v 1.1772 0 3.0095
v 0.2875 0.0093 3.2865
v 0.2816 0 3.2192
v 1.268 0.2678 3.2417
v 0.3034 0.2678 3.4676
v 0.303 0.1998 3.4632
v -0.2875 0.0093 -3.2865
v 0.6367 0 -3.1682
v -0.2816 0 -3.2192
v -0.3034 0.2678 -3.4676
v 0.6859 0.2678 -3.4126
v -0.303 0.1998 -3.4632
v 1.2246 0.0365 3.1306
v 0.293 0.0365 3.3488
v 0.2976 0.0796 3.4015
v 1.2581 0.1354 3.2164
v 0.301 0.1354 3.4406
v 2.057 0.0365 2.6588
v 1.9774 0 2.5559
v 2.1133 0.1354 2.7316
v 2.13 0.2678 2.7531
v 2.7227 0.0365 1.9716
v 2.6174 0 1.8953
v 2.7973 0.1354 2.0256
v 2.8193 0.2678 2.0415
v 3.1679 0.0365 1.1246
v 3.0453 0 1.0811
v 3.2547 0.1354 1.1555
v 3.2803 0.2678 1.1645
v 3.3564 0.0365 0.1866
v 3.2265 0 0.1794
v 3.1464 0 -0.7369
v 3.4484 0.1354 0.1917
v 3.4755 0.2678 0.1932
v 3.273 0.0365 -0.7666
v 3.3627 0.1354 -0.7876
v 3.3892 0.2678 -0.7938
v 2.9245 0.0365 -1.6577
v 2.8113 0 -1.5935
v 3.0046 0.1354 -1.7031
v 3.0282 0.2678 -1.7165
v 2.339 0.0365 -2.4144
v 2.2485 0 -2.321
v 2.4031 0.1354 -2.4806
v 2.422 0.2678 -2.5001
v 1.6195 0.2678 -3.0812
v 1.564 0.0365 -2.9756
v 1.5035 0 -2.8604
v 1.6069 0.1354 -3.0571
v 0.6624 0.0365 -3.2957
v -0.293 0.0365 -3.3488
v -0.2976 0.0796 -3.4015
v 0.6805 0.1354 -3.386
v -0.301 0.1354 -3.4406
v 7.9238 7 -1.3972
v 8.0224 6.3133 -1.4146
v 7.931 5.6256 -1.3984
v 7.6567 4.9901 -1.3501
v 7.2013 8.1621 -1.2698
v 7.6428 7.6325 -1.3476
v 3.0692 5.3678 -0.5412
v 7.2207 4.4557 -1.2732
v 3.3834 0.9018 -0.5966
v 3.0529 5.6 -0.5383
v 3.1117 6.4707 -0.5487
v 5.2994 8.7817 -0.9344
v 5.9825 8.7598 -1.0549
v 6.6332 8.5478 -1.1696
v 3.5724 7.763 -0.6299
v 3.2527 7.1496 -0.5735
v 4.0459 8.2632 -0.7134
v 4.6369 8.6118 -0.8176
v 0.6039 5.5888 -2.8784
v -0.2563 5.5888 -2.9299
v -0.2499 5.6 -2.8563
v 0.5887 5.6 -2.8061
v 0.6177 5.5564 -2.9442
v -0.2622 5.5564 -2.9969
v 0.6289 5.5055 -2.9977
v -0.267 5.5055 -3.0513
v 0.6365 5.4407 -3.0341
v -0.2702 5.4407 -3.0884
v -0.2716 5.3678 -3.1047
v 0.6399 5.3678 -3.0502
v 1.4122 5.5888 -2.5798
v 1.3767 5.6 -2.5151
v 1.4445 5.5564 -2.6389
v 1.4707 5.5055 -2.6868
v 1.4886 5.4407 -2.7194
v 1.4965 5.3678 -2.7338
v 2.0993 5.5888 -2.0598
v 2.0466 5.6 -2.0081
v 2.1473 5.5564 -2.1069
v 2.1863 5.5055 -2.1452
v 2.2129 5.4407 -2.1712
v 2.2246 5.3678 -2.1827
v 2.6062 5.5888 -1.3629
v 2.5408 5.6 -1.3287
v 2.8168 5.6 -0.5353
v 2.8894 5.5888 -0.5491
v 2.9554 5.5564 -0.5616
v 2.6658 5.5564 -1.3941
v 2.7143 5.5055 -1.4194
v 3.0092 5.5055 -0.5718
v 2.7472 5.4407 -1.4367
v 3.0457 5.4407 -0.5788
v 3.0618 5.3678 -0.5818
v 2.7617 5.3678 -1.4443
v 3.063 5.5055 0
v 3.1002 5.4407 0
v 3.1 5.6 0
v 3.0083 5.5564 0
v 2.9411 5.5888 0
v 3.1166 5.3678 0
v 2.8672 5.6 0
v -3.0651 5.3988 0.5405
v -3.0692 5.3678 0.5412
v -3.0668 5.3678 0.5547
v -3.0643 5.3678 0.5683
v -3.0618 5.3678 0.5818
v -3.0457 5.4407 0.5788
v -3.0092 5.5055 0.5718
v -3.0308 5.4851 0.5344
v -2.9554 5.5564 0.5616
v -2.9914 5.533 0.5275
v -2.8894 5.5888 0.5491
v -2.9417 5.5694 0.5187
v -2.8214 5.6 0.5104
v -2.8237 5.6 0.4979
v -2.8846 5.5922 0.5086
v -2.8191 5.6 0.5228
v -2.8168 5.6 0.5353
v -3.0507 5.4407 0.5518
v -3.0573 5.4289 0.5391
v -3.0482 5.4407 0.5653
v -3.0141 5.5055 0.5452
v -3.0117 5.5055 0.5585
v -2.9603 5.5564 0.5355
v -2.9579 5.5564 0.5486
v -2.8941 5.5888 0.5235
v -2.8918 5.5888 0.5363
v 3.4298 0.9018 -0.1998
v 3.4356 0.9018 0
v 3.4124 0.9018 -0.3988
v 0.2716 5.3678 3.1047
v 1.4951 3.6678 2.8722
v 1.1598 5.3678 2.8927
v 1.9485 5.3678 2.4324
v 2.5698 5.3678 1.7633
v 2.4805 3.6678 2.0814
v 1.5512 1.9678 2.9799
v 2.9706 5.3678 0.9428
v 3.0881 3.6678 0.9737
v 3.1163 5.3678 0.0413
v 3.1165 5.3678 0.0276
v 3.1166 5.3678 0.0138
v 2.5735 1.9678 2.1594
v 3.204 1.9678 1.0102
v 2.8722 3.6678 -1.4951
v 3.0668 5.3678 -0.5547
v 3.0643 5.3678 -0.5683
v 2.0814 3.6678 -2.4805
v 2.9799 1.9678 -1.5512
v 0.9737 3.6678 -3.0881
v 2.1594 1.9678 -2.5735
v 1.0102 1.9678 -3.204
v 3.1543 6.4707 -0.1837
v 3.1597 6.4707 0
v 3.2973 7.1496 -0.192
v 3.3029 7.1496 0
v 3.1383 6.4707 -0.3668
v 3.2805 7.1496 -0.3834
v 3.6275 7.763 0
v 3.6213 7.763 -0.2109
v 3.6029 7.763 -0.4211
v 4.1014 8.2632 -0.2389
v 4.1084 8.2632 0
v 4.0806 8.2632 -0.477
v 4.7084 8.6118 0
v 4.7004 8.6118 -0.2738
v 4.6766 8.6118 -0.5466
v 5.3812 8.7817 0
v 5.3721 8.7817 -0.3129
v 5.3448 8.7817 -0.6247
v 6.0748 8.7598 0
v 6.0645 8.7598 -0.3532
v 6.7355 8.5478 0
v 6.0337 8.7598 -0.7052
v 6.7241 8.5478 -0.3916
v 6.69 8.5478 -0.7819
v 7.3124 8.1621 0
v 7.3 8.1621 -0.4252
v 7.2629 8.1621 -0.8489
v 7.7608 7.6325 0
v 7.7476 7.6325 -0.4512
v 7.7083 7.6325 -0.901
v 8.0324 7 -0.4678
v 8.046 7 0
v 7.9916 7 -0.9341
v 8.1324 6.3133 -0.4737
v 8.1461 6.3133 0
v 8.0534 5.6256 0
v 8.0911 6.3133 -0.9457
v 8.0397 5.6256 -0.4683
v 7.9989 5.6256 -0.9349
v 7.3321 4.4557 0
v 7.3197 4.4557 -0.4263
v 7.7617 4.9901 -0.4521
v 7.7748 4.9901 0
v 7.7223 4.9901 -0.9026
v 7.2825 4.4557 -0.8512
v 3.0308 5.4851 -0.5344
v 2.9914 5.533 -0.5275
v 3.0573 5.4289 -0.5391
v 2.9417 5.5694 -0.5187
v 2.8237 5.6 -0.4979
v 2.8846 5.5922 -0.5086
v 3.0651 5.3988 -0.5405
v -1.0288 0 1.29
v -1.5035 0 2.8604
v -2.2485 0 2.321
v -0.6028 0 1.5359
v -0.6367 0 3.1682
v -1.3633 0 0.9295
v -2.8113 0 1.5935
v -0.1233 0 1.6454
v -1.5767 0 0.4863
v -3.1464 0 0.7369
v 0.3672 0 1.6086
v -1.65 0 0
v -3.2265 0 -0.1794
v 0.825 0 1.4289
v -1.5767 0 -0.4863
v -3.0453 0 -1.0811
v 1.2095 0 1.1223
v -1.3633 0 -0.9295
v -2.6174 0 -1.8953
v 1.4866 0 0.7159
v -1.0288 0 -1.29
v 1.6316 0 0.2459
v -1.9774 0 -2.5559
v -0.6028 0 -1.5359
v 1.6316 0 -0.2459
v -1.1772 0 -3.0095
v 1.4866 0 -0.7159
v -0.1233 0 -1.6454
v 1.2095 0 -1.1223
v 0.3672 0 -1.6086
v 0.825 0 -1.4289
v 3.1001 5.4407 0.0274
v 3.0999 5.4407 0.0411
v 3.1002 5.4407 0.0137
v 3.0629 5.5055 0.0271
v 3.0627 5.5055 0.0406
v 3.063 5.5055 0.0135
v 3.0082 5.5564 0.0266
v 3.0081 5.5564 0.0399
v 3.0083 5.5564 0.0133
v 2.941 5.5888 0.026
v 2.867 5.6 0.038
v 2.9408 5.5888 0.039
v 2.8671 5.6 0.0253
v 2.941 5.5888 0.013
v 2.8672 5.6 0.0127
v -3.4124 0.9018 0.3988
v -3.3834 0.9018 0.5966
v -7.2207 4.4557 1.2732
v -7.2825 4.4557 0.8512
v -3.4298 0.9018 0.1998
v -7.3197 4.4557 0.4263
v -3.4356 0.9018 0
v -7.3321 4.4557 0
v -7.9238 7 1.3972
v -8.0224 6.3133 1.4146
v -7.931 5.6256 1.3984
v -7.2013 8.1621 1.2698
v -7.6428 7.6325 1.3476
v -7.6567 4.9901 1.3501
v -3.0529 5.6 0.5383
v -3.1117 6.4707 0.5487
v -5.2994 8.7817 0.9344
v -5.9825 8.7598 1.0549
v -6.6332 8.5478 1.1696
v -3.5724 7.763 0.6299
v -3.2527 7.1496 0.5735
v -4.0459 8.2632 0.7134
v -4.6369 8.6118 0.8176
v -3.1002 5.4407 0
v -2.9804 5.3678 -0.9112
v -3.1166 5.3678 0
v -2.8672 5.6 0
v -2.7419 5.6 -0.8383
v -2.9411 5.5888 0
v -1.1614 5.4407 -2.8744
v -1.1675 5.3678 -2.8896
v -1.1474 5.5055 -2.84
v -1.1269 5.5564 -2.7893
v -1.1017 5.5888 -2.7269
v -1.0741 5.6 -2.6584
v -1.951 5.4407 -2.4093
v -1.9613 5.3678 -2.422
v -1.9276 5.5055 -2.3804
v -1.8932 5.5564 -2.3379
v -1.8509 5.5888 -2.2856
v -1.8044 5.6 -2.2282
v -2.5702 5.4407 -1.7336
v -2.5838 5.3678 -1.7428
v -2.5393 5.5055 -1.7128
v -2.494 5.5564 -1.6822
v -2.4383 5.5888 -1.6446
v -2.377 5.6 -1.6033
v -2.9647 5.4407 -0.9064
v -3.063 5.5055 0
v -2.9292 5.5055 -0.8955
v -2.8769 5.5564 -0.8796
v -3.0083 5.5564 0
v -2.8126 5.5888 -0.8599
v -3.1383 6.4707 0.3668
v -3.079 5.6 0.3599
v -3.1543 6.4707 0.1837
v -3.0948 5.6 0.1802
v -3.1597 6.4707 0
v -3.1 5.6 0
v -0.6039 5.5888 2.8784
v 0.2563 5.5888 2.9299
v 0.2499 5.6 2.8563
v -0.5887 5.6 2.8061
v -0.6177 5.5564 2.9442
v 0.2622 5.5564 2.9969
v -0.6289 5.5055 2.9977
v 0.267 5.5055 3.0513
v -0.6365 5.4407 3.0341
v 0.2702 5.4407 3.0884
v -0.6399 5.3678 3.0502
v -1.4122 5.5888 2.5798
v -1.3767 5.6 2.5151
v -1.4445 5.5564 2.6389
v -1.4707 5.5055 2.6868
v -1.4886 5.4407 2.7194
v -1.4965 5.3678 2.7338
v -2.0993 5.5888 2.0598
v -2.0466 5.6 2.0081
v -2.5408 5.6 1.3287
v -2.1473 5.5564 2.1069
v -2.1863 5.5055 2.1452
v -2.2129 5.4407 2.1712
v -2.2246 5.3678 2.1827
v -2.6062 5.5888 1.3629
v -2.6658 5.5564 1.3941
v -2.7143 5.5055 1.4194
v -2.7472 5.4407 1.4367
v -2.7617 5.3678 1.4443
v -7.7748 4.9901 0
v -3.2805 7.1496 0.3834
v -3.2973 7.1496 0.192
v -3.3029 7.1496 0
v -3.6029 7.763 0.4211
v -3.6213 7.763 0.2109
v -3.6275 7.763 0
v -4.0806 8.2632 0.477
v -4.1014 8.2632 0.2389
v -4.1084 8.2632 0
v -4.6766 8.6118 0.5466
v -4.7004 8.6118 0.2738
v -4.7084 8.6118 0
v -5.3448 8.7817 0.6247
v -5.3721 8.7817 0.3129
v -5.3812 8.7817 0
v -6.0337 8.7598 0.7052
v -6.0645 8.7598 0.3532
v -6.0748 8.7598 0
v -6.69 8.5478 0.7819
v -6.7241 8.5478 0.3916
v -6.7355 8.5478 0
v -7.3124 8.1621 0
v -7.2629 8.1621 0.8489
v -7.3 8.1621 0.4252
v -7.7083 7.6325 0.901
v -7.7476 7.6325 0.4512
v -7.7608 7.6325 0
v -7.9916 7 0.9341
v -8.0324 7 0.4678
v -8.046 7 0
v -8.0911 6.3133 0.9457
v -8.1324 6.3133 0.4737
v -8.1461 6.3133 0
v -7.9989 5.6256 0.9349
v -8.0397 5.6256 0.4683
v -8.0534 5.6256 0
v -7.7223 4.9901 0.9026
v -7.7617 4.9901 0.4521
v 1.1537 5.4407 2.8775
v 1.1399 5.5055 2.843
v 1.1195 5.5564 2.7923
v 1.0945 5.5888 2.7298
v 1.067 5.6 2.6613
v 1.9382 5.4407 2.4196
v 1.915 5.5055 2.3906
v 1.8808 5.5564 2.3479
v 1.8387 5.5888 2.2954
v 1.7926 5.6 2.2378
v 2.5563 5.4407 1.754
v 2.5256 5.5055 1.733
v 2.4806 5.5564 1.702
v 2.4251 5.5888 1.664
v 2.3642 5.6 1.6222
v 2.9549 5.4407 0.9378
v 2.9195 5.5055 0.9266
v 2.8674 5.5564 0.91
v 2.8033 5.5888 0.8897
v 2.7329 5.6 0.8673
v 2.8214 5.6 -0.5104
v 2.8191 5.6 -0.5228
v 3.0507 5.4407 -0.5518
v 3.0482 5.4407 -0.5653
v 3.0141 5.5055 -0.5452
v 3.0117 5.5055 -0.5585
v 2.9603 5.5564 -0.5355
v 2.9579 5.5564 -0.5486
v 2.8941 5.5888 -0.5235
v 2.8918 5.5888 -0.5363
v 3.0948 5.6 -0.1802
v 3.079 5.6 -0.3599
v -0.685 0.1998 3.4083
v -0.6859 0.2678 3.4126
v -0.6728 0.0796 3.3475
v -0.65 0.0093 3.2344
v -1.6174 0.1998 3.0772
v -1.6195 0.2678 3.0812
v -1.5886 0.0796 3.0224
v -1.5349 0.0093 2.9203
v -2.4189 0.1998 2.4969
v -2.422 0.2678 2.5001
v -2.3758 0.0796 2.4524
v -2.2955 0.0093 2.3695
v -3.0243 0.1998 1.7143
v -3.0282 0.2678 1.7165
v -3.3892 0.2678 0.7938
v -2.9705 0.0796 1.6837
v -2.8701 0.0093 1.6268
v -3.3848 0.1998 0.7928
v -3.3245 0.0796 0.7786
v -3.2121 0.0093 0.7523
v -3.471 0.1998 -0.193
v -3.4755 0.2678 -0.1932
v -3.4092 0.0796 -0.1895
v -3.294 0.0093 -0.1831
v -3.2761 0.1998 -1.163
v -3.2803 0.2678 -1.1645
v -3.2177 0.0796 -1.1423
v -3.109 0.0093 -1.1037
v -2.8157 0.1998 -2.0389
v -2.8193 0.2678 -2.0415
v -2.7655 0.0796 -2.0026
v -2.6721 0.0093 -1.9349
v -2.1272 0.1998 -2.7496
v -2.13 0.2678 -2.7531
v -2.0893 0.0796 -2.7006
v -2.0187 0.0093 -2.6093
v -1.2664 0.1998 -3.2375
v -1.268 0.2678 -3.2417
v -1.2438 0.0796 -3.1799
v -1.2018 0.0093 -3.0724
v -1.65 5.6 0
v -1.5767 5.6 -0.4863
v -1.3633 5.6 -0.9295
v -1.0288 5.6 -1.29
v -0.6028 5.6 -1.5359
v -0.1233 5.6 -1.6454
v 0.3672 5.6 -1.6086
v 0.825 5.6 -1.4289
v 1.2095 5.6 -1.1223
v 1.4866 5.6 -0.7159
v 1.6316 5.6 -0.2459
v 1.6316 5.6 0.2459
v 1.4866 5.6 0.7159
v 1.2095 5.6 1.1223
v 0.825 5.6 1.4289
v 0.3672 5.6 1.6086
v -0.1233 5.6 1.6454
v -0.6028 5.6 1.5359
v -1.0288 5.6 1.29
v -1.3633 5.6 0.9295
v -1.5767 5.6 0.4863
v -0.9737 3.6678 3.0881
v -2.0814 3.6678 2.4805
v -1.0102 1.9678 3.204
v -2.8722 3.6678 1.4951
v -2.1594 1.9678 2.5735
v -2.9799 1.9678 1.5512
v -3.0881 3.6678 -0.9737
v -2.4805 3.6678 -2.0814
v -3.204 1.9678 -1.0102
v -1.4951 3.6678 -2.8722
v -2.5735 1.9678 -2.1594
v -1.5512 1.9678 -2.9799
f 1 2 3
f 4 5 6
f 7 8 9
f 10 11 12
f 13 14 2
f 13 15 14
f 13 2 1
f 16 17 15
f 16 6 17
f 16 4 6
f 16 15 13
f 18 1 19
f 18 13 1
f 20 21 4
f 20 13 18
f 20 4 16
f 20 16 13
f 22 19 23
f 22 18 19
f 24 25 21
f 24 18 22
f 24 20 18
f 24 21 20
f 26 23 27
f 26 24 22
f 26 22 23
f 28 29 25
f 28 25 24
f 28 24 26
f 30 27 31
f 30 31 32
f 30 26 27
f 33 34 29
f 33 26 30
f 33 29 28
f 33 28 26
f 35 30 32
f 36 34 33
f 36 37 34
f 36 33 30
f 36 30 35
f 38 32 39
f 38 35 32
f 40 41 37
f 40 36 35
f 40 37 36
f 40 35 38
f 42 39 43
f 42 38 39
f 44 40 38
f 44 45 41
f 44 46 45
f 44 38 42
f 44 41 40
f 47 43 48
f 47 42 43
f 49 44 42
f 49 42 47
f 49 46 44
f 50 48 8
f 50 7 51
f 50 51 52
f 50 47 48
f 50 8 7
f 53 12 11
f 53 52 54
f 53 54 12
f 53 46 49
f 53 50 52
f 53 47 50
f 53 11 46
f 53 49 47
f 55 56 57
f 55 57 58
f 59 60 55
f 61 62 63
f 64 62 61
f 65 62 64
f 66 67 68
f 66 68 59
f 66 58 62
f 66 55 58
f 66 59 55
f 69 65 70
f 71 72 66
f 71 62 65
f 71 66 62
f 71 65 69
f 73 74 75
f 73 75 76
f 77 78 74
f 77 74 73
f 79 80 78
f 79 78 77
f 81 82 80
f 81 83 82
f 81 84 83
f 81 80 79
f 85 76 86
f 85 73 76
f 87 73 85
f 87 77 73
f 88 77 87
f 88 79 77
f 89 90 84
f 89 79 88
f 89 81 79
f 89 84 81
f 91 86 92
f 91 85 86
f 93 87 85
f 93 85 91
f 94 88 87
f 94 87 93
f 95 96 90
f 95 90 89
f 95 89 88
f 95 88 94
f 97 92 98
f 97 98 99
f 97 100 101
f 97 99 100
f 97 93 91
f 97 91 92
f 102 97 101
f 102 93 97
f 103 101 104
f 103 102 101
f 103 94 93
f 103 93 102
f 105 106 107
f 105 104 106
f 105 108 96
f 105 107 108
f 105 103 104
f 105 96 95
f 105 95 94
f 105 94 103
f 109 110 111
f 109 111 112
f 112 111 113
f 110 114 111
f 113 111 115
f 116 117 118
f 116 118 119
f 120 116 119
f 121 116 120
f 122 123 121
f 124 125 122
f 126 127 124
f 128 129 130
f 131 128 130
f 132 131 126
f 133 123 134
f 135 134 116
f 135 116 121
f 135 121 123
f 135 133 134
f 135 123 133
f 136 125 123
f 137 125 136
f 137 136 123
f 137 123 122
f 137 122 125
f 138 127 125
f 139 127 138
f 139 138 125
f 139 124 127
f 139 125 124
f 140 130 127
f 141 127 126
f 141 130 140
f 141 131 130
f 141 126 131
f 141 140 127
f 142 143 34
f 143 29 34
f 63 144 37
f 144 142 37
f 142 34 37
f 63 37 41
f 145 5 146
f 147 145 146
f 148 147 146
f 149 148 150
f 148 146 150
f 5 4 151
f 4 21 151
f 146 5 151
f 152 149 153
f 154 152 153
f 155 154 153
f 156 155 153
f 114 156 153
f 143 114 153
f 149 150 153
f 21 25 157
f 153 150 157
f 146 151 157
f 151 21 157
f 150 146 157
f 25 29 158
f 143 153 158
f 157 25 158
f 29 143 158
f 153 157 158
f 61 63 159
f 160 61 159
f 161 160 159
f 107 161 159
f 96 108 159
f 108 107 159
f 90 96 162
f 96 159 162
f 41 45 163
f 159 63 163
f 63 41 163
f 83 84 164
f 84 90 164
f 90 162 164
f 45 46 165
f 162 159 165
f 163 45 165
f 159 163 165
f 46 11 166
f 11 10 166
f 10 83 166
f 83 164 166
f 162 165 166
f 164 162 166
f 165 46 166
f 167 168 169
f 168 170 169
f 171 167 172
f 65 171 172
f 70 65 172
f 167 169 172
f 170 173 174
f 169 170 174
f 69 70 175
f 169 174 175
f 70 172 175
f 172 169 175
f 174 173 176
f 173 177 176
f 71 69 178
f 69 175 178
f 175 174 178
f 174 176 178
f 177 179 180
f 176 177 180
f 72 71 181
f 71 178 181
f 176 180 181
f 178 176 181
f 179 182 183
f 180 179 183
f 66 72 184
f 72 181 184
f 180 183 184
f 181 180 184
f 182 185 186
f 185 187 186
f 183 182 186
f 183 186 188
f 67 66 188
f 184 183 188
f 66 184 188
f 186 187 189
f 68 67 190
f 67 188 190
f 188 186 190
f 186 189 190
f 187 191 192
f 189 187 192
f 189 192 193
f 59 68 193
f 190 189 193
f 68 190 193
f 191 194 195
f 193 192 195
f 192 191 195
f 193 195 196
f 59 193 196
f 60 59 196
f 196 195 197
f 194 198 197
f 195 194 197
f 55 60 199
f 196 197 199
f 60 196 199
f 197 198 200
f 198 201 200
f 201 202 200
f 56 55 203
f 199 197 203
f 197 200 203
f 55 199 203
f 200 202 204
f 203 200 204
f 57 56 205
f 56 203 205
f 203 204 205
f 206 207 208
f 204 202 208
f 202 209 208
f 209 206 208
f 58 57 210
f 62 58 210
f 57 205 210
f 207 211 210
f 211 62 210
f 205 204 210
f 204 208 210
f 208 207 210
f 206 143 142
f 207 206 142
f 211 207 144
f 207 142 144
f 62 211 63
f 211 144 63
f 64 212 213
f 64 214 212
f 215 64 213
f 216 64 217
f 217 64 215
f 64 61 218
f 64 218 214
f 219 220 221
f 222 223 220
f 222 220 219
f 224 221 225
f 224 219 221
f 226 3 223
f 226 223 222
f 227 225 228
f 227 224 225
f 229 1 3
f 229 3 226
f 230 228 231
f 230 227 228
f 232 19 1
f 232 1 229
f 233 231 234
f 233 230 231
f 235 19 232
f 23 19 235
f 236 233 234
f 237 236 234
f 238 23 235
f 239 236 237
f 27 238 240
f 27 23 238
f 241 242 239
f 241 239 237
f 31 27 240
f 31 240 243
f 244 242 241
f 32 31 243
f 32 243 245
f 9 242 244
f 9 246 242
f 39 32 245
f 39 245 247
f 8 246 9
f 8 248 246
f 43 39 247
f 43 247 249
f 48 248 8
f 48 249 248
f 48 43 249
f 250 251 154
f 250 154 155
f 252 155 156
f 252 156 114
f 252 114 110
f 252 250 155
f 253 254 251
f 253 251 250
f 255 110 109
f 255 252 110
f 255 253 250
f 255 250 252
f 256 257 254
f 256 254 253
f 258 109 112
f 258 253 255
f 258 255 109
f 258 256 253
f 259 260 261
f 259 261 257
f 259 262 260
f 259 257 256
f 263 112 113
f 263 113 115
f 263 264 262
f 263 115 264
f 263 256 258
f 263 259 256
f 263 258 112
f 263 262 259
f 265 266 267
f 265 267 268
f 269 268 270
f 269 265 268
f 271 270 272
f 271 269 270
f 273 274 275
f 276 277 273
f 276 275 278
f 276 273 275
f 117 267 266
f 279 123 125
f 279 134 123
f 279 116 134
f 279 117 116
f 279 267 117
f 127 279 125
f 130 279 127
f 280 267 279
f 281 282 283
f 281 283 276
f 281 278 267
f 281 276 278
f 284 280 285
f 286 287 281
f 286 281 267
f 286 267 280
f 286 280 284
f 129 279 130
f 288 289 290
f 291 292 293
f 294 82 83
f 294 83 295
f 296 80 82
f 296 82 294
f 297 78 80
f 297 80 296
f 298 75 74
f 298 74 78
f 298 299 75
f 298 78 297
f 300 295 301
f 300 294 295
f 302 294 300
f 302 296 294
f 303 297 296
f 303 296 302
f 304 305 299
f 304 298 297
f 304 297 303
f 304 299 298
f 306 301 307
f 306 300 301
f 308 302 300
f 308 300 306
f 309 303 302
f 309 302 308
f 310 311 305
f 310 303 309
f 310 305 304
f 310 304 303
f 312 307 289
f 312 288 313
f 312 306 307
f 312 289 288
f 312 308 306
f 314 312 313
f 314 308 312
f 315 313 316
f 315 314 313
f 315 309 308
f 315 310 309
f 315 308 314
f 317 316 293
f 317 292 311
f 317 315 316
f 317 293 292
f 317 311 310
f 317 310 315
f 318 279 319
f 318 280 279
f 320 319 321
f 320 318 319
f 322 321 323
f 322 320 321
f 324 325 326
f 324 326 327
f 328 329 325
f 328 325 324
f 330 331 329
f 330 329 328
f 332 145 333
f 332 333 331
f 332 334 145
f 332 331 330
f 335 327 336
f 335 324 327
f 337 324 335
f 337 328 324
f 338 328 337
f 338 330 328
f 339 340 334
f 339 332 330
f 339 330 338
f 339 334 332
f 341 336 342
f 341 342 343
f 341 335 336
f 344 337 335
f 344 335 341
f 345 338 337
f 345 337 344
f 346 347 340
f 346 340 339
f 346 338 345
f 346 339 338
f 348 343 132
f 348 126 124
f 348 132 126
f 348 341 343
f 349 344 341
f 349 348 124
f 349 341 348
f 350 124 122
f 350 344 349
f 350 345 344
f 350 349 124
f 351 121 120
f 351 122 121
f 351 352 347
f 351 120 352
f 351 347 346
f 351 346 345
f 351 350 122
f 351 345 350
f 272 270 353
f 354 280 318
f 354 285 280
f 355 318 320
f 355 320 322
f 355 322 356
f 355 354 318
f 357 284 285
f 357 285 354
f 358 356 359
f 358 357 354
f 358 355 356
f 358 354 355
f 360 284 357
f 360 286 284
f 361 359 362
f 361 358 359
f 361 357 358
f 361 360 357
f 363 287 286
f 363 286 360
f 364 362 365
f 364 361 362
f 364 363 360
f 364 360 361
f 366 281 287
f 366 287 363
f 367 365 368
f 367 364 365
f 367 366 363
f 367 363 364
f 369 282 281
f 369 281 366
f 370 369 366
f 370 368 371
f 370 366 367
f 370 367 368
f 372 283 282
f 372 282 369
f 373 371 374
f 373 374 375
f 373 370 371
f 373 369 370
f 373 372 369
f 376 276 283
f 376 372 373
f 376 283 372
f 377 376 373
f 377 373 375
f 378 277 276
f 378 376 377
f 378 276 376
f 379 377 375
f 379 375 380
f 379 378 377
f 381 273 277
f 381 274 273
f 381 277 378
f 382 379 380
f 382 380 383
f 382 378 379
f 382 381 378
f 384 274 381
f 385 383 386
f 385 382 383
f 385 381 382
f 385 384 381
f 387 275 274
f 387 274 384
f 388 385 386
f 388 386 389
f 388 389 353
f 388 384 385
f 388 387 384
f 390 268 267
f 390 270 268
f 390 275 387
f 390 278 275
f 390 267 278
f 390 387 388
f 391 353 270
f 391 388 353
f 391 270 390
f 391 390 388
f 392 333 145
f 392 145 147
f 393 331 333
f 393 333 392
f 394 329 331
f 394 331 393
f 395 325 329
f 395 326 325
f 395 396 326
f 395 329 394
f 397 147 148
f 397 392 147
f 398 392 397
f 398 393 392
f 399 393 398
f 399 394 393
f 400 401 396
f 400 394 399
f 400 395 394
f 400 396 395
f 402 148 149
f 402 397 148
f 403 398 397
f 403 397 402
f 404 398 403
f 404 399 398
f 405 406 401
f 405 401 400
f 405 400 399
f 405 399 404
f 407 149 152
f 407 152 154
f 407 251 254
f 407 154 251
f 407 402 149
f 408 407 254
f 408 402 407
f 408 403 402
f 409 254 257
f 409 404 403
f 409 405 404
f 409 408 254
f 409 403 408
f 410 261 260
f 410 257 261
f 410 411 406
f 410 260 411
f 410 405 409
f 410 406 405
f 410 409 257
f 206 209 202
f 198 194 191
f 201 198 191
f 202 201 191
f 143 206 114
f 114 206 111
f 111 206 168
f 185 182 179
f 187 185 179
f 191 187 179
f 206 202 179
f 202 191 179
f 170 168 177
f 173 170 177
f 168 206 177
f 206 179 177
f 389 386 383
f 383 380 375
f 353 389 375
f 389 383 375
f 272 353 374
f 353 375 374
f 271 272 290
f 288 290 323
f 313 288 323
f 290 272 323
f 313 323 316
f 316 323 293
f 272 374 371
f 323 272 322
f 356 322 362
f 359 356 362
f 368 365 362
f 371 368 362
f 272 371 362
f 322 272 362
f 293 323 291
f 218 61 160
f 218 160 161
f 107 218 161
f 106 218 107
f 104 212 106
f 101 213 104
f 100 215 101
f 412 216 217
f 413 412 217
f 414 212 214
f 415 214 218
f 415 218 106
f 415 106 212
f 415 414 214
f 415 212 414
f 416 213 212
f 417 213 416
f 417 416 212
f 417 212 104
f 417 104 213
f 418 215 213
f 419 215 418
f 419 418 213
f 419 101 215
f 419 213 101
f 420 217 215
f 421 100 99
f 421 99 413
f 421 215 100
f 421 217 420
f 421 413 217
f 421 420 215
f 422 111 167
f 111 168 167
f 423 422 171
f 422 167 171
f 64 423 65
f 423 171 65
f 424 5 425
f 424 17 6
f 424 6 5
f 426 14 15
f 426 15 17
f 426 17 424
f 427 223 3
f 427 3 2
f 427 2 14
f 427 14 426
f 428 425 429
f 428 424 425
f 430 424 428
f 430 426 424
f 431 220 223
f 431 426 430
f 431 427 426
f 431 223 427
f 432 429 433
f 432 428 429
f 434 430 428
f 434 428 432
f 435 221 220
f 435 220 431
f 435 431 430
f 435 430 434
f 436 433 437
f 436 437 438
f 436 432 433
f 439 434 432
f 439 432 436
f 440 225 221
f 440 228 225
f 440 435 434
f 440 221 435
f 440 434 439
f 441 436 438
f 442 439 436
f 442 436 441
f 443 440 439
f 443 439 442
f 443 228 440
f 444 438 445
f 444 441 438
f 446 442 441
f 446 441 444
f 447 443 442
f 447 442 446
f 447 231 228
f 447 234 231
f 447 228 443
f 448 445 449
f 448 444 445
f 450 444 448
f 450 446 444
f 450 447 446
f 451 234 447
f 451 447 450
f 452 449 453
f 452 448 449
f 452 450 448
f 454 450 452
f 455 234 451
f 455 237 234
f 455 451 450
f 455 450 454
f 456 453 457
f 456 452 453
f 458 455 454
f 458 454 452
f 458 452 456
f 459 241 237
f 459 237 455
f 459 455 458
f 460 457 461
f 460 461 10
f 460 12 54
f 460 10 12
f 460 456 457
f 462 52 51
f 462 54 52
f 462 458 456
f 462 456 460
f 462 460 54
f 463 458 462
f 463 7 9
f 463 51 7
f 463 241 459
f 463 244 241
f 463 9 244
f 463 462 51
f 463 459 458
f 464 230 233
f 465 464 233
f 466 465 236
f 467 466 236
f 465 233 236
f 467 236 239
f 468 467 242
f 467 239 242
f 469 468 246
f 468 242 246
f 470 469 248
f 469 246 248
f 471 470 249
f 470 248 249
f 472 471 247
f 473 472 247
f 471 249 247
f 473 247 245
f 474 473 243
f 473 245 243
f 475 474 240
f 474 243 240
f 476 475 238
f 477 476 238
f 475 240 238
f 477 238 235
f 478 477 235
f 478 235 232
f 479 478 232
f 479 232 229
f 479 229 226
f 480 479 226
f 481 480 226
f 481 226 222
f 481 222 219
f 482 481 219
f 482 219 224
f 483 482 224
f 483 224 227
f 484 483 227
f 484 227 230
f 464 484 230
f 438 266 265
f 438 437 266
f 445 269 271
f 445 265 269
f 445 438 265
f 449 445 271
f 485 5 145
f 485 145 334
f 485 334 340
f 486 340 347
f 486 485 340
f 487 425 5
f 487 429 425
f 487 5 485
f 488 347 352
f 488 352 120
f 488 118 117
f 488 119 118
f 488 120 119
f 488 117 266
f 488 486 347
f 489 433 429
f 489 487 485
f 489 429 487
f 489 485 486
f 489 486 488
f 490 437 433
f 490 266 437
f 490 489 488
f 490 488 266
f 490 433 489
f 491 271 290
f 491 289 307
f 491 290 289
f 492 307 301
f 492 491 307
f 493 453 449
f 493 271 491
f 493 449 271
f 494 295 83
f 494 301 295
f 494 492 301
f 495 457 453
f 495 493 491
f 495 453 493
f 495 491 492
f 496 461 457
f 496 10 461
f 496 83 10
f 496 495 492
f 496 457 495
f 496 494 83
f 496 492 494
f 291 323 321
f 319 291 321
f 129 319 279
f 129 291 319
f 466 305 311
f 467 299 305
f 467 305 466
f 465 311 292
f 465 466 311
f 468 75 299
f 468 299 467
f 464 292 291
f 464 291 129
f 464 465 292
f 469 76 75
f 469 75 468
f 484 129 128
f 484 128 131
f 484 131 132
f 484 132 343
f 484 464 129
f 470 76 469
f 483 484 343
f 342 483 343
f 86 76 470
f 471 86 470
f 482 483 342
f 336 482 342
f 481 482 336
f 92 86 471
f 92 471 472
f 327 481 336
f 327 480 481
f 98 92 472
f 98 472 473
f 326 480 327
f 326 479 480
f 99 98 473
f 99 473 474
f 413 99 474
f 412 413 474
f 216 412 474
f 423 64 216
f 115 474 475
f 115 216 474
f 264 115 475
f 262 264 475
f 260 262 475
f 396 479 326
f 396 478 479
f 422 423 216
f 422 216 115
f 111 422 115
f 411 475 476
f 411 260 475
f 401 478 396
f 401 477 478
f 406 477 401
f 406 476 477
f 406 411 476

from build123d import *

# Parameters (mm, degrees)
REVOLU_O3_ANGLE                             = 10
CORTE_EXTRUS_O2_DEPTH                       = 10
BROCA_DE_ROSQUEAR_PARA_TARRAXA_DE_M41_D     = 3.3
BROCA_DE_ROSQUEAR_PARA_TARRAXA_DE_M41_DEPTH = 10
BROCA_DE_ROSQUEAR_PARA_TARRAXA_DE_M41_TIP   = 0.991420021
FILETE1_R                                   = 0.25


with BuildPart() as part:
    # Esboço1 → Revolução2 (revolve)
    with BuildSketch(Plane.XY, mode=Mode.PRIVATE) as revolu_o2_sk:
        Polygon((3.1, 5.6), (3.5, 0), (0, 0), (0, 5.6), align=None)
    revolve(revolu_o2_sk.sketch.rotate(Axis((0, 0, 0), (0, 1, 0)), 90), axis=Axis((0, 0, 0), (0, 1, 0)))

    # Esboço3 → Revolução3 (revolve)
    with BuildSketch(Plane.XY):
        with BuildLine():
            Line((3.1, 5.6), (3.159667096, 6.470663935))
            ThreePointArc((3.159667096, 6.470663935), (6.735500159, 8.547793041), (7.332110812, 4.455714945))
            Line((7.332110812, 4.455714945), (3.429154002, 0.895958371))
            Line((3.429154002, 0.895958371), (3.1, 5.6))
        make_face()
    revolve(axis=Axis((0, 0, 0), (0, 1, 0)), revolution_arc=REVOLU_O3_ANGLE)

    # Esboço4 → Corte-extrusão2 (cut)
    with BuildSketch(Plane(origin=(0, 5.6, 0), x_dir=(1, 0, 0), z_dir=(0, 1, 0))):
        with BuildLine():
            Line((0.270182803, -3.088203564), (0, 0))
            Line((0, 0), (-0.270182803, 3.088203564))
            ThreePointArc((-0.270182803, 3.088203564), (-3.088203564, -0.270182803), (0.270182803, -3.088203564))
        make_face()
        with BuildLine():
            Line((0.342968893, -3.920152382), (0.270182803, -3.088203564))
            ThreePointArc((0.270182803, -3.088203564), (-3.088203564, -0.270182803), (-0.270182803, 3.088203564))
            Line((-0.270182803, 3.088203564), (-0.342968893, 3.920152382))
            ThreePointArc((-0.342968893, 3.920152382), (-3.920152382, -0.342968893), (0.342968893, -3.920152382))
        make_face()
    extrude(amount=-CORTE_EXTRUS_O2_DEPTH, mode=Mode.SUBTRACT)

    # Espelhar1: part across face


with BuildPart() as part_1:
    add(part.part)
    add(part.part.mirror(Plane(origin=(0, 2.743434343, 0), x_dir=(0.08715574300604889, 0, 0.9961946980691392), z_dir=(-0.9961946980691393, 0, 0.08715574300604889))))

    # Broca de rosquear para tarraxa de M41
    with Locations(Plane(origin=(0, 5.6, 0), x_dir=(1, 0, 0), z_dir=(0, 1, 0))):
        with Locations((0, 0)):
            Hole(BROCA_DE_ROSQUEAR_PARA_TARRAXA_DE_M41_D / 2, depth=BROCA_DE_ROSQUEAR_PARA_TARRAXA_DE_M41_DEPTH)
            with Locations((0, 0, -(BROCA_DE_ROSQUEAR_PARA_TARRAXA_DE_M41_DEPTH + BROCA_DE_ROSQUEAR_PARA_TARRAXA_DE_M41_TIP / 2))):  # 118° drill point
                Cone(0, BROCA_DE_ROSQUEAR_PARA_TARRAXA_DE_M41_D / 2, BROCA_DE_ROSQUEAR_PARA_TARRAXA_DE_M41_TIP, mode=Mode.SUBTRACT)

    # Filete1
    # the kernel refuses this fillet: 0.25 mm, written as the material it takes off along each edge
    with BuildSketch(Plane(origin=(0, 5.6, 0), x_dir=(0.08715574274766005, 0, 0.9961946980917454), z_dir=(-0.9961946980917454, 0, 0.08715574274766005))) as filete1_piece_1:
        with BuildLine():
            CenterArc((3.1 - FILETE1_R * 0.931119203401, -FILETE1_R), FILETE1_R, 4.08561678, 85.91438322)
            Line((3.1 - FILETE1_R * 0.931119203401, 0), (3.1, 0))
            Line((3.1, 0), (3.1 + FILETE1_R * 0.0663394964294, -FILETE1_R * 0.928752950012))
        make_face()
    revolve(axis=Axis((0, 5.6, 0), (0, 1, 0)), revolution_arc=85, mode=Mode.SUBTRACT)
    with BuildSketch(Plane(origin=(0, 5.6, 0), x_dir=(0.08715574274766005, 0, 0.9961946980917454), z_dir=(-0.9961946980917454, 0, 0.08715574274766005))) as filete1_piece_2_section:
        with BuildLine():
            CenterArc((3.1 - FILETE1_R * 0.931119203401, -FILETE1_R), FILETE1_R, 4.08561678, 85.91438322)
            Line((3.1 - FILETE1_R * 0.931119203401, 0), (3.1, 0))
            Line((3.1, 0), (3.1 + FILETE1_R * 0.0663394964294, -FILETE1_R * 0.928752950012))
        make_face()
    filete1_piece_2 = revolve(axis=Axis((0, 5.6, 0), (0, 1, 0)), revolution_arc=95.759741079, mode=Mode.PRIVATE)
    filete1_piece_2 = split(filete1_piece_2, bisect_by=Plane(origin=(3.054670317, 5.486797578, -0.538620794), z_dir=(-0.17364817766693072, 0, -0.984807753012208)), keep=Keep.TOP, mode=Mode.PRIVATE)
    add(filete1_piece_2, mode=Mode.SUBTRACT)
    with BuildSketch(Plane(origin=(0, 0, 0), x_dir=(0.08715574274766182, 0, 0.9961946980917452), z_dir=(-0.9961946980917452, 0, 0.08715574274766182))) as filete1_piece_3:
        with BuildLine():
            CenterArc((3.5 - FILETE1_R * 1.07397634626, FILETE1_R), FILETE1_R, 270, 94.08561678)
            Line((3.5 - FILETE1_R * 1.07397634626, 0), (3.5, 0))
            Line((3.5, 0), (3.5 - FILETE1_R * 0.0765176464277, FILETE1_R * 1.07124704999))
        make_face()
    revolve(axis=Axis((0, 0, 0), (0, 1, 0)), revolution_arc=180, mode=Mode.SUBTRACT)
    with BuildSketch(Plane(origin=(0, 5.6, 0), x_dir=(-0.08715574274762866, 0, -0.9961946980917481), z_dir=(-0.9961946980917481, 0, 0.08715574274762866))) as filete1_piece_4:
        with BuildLine():
            CenterArc((3.1 - FILETE1_R * 0.931119203401, FILETE1_R), FILETE1_R, 270, 85.91438322)
            Line((3.1 - FILETE1_R * 0.931119203401, 0), (3.1, 0))
            Line((3.1, 0), (3.1 + FILETE1_R * 0.0663394964294, FILETE1_R * 0.928752950012))
        make_face()
    revolve(axis=Axis((0, 5.6, 0), (0, -1, 0)), revolution_arc=85, mode=Mode.SUBTRACT)
    with BuildSketch(Plane(origin=(0, 5.6, 0), x_dir=(-0.08715574274762866, 0, -0.9961946980917481), z_dir=(-0.9961946980917481, 0, 0.08715574274762866))) as filete1_piece_5_section:
        with BuildLine():
            CenterArc((3.1 - FILETE1_R * 0.931119203401, FILETE1_R), FILETE1_R, 270, 85.91438322)
            Line((3.1 - FILETE1_R * 0.931119203401, 0), (3.1, 0))
            Line((3.1, 0), (3.1 + FILETE1_R * 0.0663394964294, FILETE1_R * 0.928752950012))
        make_face()
    filete1_piece_5 = revolve(axis=Axis((0, 5.6, 0), (0, -1, 0)), revolution_arc=95.759741079, mode=Mode.PRIVATE)
    filete1_piece_5 = split(filete1_piece_5, bisect_by=Plane(origin=(3.10179353, 5.486797578, 0), z_dir=(0, 0, 1)), keep=Keep.TOP, mode=Mode.PRIVATE)
    add(filete1_piece_5, mode=Mode.SUBTRACT)
    with BuildSketch(Plane(origin=(0, 5.6, 0), x_dir=(-0.08715574326446912, 0, -0.9961946980465305), z_dir=(0.9961946980465305, 0, -0.08715574326446912))) as filete1_piece_6:
        with BuildLine():
            CenterArc((3.1 - FILETE1_R * 0.931119203401, -FILETE1_R), FILETE1_R, 4.08561678, 85.91438322)
            Line((3.1 + FILETE1_R * 0.0663394964294, -FILETE1_R * 0.928752950012), (3.1, 0))
            Line((3.1, 0), (3.1 - FILETE1_R * 0.931119203401, 0))
        make_face()
    revolve(axis=Axis((0, 5.6, 0), (0, 1, 0)), revolution_arc=85, mode=Mode.SUBTRACT)
    with BuildSketch(Plane(origin=(0, 5.6, 0), x_dir=(-0.08715574326446912, 0, -0.9961946980465305), z_dir=(0.9961946980465305, 0, -0.08715574326446912))) as filete1_piece_7_section:
        with BuildLine():
            CenterArc((3.1 - FILETE1_R * 0.931119203401, -FILETE1_R), FILETE1_R, 4.08561678, 85.91438322)
            Line((3.1 + FILETE1_R * 0.0663394964294, -FILETE1_R * 0.928752950012), (3.1, 0))
            Line((3.1, 0), (3.1 - FILETE1_R * 0.931119203401, 0))
        make_face()
    filete1_piece_7 = revolve(axis=Axis((0, 5.6, 0), (0, 1, 0)), revolution_arc=95.759741079, mode=Mode.PRIVATE)
    filete1_piece_7 = split(filete1_piece_7, bisect_by=Plane(origin=(-2.996372834, 5.561029125, 0.528341377), z_dir=(0.17364817817780473, 0, 0.9848077529221271)), keep=Keep.TOP, mode=Mode.PRIVATE)
    add(filete1_piece_7, mode=Mode.SUBTRACT)
    with BuildSketch(Plane(origin=(0, 0, 0), x_dir=(0.08715574326443595, 0, 0.9961946980465334), z_dir=(0.9961946980465334, 0, -0.08715574326443595))) as filete1_piece_8:
        with BuildLine():
            CenterArc((3.5 - FILETE1_R * 1.07397634626, -FILETE1_R), FILETE1_R, 355.91438322, 94.08561678)
            Line((3.5 - FILETE1_R * 1.07397634626, 0), (3.5, 0))
            Line((3.5, 0), (3.5 - FILETE1_R * 0.0765176464277, -FILETE1_R * 1.07124704999))
        make_face()
    revolve(axis=Axis((0, 0, 0), (0, -1, 0)), revolution_arc=180, mode=Mode.SUBTRACT)
    with BuildSketch(Plane(origin=(0, 5.6, 0), x_dir=(0.08715574326443776, 0, 0.996194698046533), z_dir=(0.996194698046533, 0, -0.08715574326443776))) as filete1_piece_9:
        with BuildLine():
            CenterArc((3.1 - FILETE1_R * 0.931119203401, FILETE1_R), FILETE1_R, 270, 85.91438322)
            Line((3.1 + FILETE1_R * 0.0663394964294, FILETE1_R * 0.928752950012), (3.1, 0))
            Line((3.1, 0), (3.1 - FILETE1_R * 0.931119203401, 0))
        make_face()
    revolve(axis=Axis((0, 5.6, 0), (0, -1, 0)), revolution_arc=85, mode=Mode.SUBTRACT)
    with BuildSketch(Plane(origin=(0, 5.6, 0), x_dir=(0.08715574326443776, 0, 0.996194698046533), z_dir=(0.996194698046533, 0, -0.08715574326443776))) as filete1_piece_10_section:
        with BuildLine():
            CenterArc((3.1 - FILETE1_R * 0.931119203401, FILETE1_R), FILETE1_R, 270, 85.91438322)
            Line((3.1 + FILETE1_R * 0.0663394964294, FILETE1_R * 0.928752950012), (3.1, 0))
            Line((3.1, 0), (3.1 - FILETE1_R * 0.931119203401, 0))
        make_face()
    filete1_piece_10 = revolve(axis=Axis((0, 5.6, 0), (0, -1, 0)), revolution_arc=95.759741079, mode=Mode.PRIVATE)
    filete1_piece_10 = split(filete1_piece_10, bisect_by=Plane(origin=(-3.042596715, 5.561029125, 2e-09), z_dir=(-5.187550944363294e-10, 0, -1.0)), keep=Keep.TOP, mode=Mode.PRIVATE)
    add(filete1_piece_10, mode=Mode.SUBTRACT)


solid = part_1.part
